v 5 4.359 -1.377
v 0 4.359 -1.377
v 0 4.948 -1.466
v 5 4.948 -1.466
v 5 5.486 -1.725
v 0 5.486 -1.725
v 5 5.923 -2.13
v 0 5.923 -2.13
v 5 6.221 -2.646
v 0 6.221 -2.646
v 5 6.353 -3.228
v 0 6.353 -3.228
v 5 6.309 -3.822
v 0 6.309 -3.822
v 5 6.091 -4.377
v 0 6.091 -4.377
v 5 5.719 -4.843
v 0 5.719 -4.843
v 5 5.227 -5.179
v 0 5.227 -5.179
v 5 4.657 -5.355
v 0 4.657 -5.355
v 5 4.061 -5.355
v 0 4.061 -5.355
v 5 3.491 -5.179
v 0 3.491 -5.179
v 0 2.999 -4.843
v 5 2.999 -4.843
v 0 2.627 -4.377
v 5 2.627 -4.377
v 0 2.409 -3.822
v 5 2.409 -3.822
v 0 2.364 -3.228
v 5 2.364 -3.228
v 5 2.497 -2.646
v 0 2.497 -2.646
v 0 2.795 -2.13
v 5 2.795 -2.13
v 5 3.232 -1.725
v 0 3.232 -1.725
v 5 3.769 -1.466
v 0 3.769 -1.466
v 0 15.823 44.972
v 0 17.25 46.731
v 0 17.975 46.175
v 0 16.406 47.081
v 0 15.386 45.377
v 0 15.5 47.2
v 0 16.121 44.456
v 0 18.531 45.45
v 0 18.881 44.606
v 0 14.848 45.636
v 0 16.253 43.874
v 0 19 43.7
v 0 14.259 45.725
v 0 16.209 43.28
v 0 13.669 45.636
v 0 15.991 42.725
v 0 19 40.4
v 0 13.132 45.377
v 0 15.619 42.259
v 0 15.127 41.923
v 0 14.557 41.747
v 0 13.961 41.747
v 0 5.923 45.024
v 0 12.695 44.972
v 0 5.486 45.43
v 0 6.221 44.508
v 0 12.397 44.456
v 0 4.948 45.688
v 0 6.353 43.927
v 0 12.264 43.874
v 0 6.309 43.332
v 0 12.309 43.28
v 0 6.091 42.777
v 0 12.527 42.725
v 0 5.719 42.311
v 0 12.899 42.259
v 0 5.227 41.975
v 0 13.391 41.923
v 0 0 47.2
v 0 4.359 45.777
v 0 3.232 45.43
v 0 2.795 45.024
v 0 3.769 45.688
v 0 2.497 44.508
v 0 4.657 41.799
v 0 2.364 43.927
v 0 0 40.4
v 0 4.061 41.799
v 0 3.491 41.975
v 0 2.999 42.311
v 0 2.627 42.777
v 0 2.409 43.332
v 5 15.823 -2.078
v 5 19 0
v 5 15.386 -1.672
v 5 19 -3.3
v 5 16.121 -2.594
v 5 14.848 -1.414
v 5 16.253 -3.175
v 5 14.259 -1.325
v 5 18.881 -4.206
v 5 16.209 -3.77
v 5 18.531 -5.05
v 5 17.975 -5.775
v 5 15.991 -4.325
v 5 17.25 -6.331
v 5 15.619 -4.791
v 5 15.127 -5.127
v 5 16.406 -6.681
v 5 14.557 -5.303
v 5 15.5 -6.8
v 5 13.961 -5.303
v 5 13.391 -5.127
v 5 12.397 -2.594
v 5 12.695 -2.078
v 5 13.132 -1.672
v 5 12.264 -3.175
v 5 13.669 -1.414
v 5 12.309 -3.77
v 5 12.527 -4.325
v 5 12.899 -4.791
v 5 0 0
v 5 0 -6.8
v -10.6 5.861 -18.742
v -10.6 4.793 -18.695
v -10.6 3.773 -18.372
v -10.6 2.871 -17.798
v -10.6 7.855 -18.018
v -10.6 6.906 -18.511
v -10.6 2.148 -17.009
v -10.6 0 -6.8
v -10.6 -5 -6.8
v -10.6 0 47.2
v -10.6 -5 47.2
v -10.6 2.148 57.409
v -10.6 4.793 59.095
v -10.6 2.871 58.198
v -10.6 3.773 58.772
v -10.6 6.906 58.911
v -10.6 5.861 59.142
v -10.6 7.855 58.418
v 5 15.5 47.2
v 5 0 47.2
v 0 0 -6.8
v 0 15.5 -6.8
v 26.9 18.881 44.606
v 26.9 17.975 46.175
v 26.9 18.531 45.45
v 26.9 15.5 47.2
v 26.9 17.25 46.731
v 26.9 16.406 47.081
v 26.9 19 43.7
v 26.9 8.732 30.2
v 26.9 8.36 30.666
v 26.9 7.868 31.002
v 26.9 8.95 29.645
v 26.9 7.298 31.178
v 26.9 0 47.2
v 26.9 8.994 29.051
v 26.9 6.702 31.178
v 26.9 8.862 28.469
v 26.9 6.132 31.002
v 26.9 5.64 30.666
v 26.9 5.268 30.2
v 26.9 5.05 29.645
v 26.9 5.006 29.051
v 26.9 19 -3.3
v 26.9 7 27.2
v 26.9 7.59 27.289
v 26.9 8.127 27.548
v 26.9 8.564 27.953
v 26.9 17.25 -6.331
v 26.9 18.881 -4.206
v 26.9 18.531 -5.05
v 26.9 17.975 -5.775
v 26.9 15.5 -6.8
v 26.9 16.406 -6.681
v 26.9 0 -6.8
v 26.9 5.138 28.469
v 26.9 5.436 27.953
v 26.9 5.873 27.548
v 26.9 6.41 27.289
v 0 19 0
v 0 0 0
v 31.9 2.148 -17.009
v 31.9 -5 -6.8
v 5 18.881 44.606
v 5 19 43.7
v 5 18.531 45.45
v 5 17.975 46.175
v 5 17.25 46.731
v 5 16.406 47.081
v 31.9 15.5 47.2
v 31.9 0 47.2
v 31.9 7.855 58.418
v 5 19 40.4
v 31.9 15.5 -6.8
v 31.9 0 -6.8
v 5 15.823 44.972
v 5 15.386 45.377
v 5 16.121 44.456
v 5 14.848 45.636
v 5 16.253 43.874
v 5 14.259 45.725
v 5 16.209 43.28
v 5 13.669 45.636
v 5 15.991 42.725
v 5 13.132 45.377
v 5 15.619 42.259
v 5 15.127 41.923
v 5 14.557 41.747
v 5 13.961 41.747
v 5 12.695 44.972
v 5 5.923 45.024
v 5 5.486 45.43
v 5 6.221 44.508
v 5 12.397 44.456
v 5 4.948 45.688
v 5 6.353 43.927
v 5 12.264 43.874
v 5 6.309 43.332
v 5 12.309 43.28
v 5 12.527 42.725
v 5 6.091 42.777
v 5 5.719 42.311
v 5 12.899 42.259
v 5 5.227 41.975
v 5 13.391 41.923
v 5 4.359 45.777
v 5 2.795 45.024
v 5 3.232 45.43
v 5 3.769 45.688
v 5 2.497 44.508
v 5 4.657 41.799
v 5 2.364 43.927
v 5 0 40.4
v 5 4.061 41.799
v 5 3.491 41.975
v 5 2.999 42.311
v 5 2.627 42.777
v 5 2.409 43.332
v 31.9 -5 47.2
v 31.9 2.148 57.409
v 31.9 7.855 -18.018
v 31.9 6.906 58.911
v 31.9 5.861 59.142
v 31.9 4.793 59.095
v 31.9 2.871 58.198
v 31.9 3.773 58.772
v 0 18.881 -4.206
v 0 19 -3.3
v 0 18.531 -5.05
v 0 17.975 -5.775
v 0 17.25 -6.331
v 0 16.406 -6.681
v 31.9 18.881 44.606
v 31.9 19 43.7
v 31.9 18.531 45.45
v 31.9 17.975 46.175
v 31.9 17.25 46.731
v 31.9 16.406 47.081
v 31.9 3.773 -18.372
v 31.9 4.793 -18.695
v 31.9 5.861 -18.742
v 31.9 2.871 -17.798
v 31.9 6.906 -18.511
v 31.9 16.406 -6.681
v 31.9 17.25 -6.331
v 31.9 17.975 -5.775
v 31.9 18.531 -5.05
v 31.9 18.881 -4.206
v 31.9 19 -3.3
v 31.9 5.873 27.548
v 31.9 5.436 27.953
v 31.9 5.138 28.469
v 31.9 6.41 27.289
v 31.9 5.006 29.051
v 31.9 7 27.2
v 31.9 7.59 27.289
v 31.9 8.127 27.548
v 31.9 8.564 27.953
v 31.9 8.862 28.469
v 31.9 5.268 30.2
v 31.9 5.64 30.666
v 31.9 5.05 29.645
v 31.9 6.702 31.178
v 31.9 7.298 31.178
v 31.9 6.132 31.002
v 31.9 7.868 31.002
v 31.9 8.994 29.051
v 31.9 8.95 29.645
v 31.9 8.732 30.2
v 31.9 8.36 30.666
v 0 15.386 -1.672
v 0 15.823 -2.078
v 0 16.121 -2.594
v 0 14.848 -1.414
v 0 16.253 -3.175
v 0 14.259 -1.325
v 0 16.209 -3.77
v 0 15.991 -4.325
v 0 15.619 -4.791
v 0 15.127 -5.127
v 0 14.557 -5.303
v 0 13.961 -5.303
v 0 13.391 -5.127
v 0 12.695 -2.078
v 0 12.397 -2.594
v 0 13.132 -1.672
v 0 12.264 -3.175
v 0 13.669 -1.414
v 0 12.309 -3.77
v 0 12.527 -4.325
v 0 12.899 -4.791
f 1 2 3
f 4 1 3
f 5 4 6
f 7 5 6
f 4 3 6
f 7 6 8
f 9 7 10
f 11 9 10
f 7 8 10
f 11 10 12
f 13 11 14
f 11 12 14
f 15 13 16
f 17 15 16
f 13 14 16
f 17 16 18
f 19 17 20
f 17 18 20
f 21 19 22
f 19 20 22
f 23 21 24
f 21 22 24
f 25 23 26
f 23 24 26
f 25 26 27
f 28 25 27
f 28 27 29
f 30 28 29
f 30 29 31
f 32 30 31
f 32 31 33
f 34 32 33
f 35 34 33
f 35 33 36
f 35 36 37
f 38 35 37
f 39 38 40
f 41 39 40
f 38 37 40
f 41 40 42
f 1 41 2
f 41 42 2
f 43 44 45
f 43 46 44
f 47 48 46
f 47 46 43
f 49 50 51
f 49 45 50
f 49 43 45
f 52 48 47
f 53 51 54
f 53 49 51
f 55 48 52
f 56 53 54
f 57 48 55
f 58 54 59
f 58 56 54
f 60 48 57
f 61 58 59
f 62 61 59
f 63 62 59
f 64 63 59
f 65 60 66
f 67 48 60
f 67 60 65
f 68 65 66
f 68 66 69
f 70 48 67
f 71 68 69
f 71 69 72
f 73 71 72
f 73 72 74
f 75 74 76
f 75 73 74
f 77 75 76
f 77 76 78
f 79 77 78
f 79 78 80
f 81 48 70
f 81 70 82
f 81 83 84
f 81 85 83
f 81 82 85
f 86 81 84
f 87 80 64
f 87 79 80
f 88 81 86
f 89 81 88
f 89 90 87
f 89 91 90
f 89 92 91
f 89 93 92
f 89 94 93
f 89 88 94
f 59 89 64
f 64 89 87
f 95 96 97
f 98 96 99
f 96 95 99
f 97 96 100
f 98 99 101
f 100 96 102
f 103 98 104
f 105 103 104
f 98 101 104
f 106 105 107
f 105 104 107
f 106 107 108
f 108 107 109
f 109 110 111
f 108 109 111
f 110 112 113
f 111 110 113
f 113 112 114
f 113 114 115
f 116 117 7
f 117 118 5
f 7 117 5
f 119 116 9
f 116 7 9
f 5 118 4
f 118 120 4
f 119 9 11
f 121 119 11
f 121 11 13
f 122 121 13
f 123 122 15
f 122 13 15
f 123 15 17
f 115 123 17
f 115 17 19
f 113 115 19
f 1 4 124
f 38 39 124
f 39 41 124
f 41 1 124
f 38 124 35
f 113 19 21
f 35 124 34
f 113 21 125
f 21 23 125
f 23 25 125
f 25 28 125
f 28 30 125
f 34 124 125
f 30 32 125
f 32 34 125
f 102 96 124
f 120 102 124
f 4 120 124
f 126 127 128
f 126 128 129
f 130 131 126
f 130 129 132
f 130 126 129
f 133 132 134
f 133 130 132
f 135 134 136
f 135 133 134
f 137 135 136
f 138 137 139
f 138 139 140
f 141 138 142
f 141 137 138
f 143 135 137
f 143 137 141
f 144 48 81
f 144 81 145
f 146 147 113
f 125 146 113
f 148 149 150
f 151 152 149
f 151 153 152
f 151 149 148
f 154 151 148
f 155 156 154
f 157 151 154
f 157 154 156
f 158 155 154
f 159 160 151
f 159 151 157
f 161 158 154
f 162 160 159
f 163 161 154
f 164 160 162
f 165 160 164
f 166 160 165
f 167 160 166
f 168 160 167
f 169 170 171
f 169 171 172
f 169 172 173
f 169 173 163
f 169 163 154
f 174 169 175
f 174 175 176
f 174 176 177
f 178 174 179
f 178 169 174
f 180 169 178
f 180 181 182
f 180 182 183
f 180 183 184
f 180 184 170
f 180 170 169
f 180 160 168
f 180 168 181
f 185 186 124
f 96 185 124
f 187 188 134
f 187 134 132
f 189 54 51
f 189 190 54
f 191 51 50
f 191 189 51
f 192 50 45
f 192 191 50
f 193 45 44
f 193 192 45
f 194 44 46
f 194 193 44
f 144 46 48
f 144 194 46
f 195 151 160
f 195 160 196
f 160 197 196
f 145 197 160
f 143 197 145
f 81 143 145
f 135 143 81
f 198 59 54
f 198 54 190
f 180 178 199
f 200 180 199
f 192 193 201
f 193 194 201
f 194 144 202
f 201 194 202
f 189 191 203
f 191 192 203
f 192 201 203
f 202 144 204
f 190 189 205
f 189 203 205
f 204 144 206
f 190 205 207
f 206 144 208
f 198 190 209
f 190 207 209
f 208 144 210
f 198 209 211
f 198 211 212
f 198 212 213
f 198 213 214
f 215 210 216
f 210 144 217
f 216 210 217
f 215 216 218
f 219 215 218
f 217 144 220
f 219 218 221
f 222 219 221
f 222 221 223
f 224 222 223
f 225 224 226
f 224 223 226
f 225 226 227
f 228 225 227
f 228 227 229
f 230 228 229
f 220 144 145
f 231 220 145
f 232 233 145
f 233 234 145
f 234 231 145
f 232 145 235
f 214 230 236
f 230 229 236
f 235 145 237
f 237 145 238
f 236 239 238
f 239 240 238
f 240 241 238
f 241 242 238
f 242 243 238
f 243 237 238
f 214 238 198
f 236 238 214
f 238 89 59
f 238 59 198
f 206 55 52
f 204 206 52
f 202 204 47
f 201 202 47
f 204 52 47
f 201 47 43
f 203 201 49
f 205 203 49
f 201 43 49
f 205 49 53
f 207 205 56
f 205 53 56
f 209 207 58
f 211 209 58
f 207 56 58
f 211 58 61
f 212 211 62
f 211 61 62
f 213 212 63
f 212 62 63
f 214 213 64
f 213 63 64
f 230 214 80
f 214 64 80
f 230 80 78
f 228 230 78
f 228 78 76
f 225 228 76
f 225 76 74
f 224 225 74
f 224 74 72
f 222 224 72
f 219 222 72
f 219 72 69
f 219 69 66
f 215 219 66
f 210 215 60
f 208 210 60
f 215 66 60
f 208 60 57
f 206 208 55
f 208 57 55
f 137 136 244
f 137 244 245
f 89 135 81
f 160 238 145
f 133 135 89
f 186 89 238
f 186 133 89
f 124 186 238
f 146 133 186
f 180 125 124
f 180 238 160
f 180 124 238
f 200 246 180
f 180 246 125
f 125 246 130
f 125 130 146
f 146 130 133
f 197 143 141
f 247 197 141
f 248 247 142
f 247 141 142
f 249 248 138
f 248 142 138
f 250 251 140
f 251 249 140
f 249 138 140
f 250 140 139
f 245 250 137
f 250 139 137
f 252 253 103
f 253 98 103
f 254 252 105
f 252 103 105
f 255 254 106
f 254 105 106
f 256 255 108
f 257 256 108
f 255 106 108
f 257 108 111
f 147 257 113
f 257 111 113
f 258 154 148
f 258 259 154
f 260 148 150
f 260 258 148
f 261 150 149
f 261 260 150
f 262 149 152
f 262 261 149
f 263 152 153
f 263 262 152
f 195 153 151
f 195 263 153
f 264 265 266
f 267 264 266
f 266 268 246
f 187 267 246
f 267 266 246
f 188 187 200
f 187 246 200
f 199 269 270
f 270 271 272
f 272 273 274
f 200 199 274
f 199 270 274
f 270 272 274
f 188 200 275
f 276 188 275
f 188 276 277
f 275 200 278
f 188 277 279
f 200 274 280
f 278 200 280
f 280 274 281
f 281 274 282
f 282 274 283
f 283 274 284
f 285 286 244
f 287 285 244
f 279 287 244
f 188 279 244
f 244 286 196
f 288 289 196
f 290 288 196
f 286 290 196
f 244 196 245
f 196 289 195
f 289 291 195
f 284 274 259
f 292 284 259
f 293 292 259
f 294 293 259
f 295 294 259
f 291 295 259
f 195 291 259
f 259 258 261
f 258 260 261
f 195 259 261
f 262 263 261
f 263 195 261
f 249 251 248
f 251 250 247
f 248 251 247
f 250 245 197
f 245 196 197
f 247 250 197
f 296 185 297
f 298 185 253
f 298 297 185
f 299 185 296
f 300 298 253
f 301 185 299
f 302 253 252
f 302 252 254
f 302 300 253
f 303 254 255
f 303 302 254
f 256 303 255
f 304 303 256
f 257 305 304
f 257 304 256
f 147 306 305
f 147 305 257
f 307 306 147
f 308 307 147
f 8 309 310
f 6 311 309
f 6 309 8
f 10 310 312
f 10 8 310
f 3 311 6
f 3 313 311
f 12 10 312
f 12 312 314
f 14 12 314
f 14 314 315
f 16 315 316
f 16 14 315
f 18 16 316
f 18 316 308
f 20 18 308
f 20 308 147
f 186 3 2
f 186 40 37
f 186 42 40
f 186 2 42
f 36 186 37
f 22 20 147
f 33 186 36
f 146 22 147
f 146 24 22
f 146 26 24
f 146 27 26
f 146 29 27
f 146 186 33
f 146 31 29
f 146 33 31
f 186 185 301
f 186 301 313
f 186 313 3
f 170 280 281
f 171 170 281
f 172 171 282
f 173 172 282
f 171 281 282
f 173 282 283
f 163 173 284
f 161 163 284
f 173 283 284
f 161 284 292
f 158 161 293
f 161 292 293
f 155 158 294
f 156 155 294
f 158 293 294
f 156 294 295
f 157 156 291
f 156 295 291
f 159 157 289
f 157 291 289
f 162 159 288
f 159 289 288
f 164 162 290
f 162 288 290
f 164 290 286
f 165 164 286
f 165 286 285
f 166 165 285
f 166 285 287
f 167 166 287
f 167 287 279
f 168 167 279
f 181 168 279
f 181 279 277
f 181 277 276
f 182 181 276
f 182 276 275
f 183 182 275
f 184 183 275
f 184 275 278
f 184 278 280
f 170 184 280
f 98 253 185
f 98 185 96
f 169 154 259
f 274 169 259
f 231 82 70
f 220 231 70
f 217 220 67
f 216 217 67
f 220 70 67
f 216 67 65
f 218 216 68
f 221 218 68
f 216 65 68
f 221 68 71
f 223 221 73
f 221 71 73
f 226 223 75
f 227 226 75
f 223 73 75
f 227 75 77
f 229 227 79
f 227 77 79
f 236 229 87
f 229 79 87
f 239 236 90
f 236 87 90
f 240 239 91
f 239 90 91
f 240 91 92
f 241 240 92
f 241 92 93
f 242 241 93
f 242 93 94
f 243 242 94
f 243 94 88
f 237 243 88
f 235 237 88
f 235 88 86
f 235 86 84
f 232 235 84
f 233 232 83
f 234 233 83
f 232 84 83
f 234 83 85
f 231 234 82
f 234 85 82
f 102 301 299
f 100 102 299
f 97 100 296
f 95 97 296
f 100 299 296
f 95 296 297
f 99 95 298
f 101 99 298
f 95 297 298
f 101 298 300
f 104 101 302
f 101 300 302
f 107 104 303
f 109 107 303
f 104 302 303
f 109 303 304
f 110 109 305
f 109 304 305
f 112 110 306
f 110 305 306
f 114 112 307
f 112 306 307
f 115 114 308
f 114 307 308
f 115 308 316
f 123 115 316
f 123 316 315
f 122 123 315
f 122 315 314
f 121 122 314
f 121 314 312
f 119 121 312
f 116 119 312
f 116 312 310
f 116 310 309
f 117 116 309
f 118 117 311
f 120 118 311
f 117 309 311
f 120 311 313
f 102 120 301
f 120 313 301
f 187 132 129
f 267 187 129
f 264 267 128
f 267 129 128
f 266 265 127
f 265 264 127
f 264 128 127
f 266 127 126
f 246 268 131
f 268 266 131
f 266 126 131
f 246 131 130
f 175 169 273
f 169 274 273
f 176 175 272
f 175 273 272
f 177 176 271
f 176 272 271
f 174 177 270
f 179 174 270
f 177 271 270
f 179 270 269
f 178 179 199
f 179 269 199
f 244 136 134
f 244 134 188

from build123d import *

# Parameters (mm, degrees)
SKETCH_OF_SERVO_MOTOR_W               = 42.5
SKETCH_OF_SERVO_MOTOR_H               = 54
EXTRUDE_BASE_OF_FOOT_DEPTH            = 5
POSITIONS_OF_FOOT_SIDES_W             = 5
POSITIONS_OF_FOOT_SIDES_H             = 54
POSITIONS_OF_FOOT_SIDES_H_2           = 6.8
EXTRUDE_SIDES_OF_FOOT_DEPTH           = 19
FILLET_TOP_EDGES_OF_SIDES_OF_FOOT_R   = 3.5
EXTRUDE_FOOT_LIPS_DEPTH               = 42.5
FILLET_FOOT_LIPS_R                    = 4.1
HOLE_DIMENSIONS_FOR_M4_BOLT_R         = 2
EXTRUDE_CUT_HOLE_FOR_M4_BOLT_DEPTH    = 5
CUT_EXTRUDE1_REACH                    = 77.278
DIMENSIONS_FOR_OUTSIDE_FOOT_M4_HOLE_R = 2


with BuildPart() as part:
    # Sketch of Servo Motor → Extrude Base of Foot (new body)
    with BuildSketch(Plane(origin=(0, 0, 0), x_dir=(1, 0, 0), z_dir=(0, 1, 0))):
        with Locations((10.65, -20.2)):
            Rectangle(SKETCH_OF_SERVO_MOTOR_W, SKETCH_OF_SERVO_MOTOR_H)
    extrude(amount=-EXTRUDE_BASE_OF_FOOT_DEPTH)

    # Positions of Foot Sides → Extrude Sides of Foot (add)
    with BuildSketch(Plane(origin=(0, 0, 0), x_dir=(1, 0, 0), z_dir=(0, 1, 0))):
        with Locations((29.4, -20.2)):
            Rectangle(POSITIONS_OF_FOOT_SIDES_W, POSITIONS_OF_FOOT_SIDES_H)
        with Locations((2.5, 3.4)):
            Rectangle(POSITIONS_OF_FOOT_SIDES_W, POSITIONS_OF_FOOT_SIDES_H_2)
        with Locations((2.5, -43.8)):
            Rectangle(POSITIONS_OF_FOOT_SIDES_W, POSITIONS_OF_FOOT_SIDES_H_2)
    extrude(amount=EXTRUDE_SIDES_OF_FOOT_DEPTH)

    # Fillet Top Edges of Sides of Foot
    fillet_top_edges_of_sides_of_foot_edges = [part.edges().sort_by_distance(p)[0] for p in [
        (2.5, 19, -6.8),
        (2.5, 19, 47.2),
        (29.4, 19, -6.8),
        (29.4, 19, 47.2),
    ]]
    fillet(fillet_top_edges_of_sides_of_foot_edges, radius=FILLET_TOP_EDGES_OF_SIDES_OF_FOOT_R)

    # Front and Back Foot Lips → Extrude Foot Lips (add, through all)
    with BuildSketch(Plane.ZY.offset(10.6)):
        Polygon((60.767406064, 4.5), (58.418174512, 7.855050358), (47.2, 0), (47.2, -5), align=None)
        Polygon((-6.8, 0), (-6.8, -5), (-20.367406064, 4.5), (-18.018174512, 7.855050358), align=None)
    extrude(amount=-EXTRUDE_FOOT_LIPS_DEPTH)

    # Fillet Foot Lips
    # the kernel refuses this fillet: 4.1 mm, written as the material it takes off along each edge
    with BuildSketch(Plane(origin=(-20.85, 4.5, 60.767406064), x_dir=(0, 0.8191520442889908, -0.5735764363510476), z_dir=(1, 0, 0)), Plane(origin=(-20.85, 4.5, -20.367406064), x_dir=(0, -0.5735764363510438, 0.8191520442889934), z_dir=(1, 0, 0))) as fillet_foot_lips_piece_1:
        with BuildLine():
            CenterArc((FILLET_FOOT_LIPS_R, -FILLET_FOOT_LIPS_R), FILLET_FOOT_LIPS_R, 90, 90)
            Line((0, -FILLET_FOOT_LIPS_R), (0, 0))
            Line((0, 0), (FILLET_FOOT_LIPS_R, 0))
        make_face()
    extrude(amount=63, mode=Mode.SUBTRACT)

    # Hole Dimensions for M4 Bolt → Extrude Cut Hole for M4 Bolt (cut)
    with BuildSketch(Plane.ZY):
        with Locations((-3.324953132, 14.258904835)):
            Circle(HOLE_DIMENSIONS_FOR_M4_BOLT_R)
        with Locations((-3.377058396, 4.358904835)):
            Circle(HOLE_DIMENSIONS_FOR_M4_BOLT_R)
        with Locations((43.724953132, 14.258904835)):
            Circle(HOLE_DIMENSIONS_FOR_M4_BOLT_R)
        with Locations((43.777058396, 4.358904835)):
            Circle(HOLE_DIMENSIONS_FOR_M4_BOLT_R)
    extrude(amount=-EXTRUDE_CUT_HOLE_FOR_M4_BOLT_DEPTH, mode=Mode.SUBTRACT)

    # Dimensions for Outside Foot M4 Hole → Cut-Extrude1 (cut, up to next)
    with BuildSketch(Plane(origin=(31.9, 0, 0), x_dir=(0, 0, -1), z_dir=(1, 0, 0)), mode=Mode.PRIVATE) as cut_extrude1_sk1:
        with Locations((-29.2, 7)):
            Circle(DIMENSIONS_FOR_OUTSIDE_FOOT_M4_HOLE_R)
    cut_extrude1_tool1 = extrude(cut_extrude1_sk1.sketch, amount=-CUT_EXTRUDE1_REACH, mode=Mode.PRIVATE) & part.part
    add(cut_extrude1_tool1.solids().sort_by_distance((31.9, 7, 29.2))[0], mode=Mode.SUBTRACT)


solid = part.part
